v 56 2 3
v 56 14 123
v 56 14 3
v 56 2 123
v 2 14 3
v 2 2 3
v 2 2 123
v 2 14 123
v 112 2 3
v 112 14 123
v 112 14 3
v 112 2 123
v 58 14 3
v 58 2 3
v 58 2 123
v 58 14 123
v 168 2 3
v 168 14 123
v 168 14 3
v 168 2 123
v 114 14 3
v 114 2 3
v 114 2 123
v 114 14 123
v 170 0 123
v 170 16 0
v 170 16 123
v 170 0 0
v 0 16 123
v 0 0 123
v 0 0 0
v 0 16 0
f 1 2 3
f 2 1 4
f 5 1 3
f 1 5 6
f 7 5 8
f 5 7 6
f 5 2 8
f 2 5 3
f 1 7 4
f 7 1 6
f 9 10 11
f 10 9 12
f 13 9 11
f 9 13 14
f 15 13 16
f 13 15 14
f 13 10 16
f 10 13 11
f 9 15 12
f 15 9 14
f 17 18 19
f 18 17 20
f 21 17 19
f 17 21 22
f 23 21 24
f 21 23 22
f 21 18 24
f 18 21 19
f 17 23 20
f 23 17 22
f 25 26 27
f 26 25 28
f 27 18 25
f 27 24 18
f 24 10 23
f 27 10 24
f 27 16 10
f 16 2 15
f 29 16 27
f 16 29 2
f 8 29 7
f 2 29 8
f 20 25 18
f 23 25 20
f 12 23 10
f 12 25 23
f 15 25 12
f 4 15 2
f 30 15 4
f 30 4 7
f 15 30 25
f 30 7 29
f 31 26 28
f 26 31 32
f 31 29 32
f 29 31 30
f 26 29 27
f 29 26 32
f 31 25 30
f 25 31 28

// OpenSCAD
function sumv(v,i,s=0) = (i<0 ? 0 :(i==s ? v[i] : v[i] + sumv(v,i-1,s)));

lgs = [54,54,54];
ep_pt_cotes = 2;
ep_gd_cotes = 2;
ep_fond = 3;
ep_inter = 2;
largeur = 12;
hauteur = 120;

difference()
{
    color("red")
    cube([sumv(lgs,len(lgs)-1)+(len(lgs)-1)*ep_inter+2*ep_pt_cotes,largeur+2*ep_gd_cotes,ep_fond+hauteur]);
    
    for(i = [0 : len(lgs)-1])
        translate([ep_pt_cotes+sumv(lgs,i-1)+i*ep_inter,ep_gd_cotes,ep_fond])
        cube([lgs[i],largeur,hauteur+1]);
}
